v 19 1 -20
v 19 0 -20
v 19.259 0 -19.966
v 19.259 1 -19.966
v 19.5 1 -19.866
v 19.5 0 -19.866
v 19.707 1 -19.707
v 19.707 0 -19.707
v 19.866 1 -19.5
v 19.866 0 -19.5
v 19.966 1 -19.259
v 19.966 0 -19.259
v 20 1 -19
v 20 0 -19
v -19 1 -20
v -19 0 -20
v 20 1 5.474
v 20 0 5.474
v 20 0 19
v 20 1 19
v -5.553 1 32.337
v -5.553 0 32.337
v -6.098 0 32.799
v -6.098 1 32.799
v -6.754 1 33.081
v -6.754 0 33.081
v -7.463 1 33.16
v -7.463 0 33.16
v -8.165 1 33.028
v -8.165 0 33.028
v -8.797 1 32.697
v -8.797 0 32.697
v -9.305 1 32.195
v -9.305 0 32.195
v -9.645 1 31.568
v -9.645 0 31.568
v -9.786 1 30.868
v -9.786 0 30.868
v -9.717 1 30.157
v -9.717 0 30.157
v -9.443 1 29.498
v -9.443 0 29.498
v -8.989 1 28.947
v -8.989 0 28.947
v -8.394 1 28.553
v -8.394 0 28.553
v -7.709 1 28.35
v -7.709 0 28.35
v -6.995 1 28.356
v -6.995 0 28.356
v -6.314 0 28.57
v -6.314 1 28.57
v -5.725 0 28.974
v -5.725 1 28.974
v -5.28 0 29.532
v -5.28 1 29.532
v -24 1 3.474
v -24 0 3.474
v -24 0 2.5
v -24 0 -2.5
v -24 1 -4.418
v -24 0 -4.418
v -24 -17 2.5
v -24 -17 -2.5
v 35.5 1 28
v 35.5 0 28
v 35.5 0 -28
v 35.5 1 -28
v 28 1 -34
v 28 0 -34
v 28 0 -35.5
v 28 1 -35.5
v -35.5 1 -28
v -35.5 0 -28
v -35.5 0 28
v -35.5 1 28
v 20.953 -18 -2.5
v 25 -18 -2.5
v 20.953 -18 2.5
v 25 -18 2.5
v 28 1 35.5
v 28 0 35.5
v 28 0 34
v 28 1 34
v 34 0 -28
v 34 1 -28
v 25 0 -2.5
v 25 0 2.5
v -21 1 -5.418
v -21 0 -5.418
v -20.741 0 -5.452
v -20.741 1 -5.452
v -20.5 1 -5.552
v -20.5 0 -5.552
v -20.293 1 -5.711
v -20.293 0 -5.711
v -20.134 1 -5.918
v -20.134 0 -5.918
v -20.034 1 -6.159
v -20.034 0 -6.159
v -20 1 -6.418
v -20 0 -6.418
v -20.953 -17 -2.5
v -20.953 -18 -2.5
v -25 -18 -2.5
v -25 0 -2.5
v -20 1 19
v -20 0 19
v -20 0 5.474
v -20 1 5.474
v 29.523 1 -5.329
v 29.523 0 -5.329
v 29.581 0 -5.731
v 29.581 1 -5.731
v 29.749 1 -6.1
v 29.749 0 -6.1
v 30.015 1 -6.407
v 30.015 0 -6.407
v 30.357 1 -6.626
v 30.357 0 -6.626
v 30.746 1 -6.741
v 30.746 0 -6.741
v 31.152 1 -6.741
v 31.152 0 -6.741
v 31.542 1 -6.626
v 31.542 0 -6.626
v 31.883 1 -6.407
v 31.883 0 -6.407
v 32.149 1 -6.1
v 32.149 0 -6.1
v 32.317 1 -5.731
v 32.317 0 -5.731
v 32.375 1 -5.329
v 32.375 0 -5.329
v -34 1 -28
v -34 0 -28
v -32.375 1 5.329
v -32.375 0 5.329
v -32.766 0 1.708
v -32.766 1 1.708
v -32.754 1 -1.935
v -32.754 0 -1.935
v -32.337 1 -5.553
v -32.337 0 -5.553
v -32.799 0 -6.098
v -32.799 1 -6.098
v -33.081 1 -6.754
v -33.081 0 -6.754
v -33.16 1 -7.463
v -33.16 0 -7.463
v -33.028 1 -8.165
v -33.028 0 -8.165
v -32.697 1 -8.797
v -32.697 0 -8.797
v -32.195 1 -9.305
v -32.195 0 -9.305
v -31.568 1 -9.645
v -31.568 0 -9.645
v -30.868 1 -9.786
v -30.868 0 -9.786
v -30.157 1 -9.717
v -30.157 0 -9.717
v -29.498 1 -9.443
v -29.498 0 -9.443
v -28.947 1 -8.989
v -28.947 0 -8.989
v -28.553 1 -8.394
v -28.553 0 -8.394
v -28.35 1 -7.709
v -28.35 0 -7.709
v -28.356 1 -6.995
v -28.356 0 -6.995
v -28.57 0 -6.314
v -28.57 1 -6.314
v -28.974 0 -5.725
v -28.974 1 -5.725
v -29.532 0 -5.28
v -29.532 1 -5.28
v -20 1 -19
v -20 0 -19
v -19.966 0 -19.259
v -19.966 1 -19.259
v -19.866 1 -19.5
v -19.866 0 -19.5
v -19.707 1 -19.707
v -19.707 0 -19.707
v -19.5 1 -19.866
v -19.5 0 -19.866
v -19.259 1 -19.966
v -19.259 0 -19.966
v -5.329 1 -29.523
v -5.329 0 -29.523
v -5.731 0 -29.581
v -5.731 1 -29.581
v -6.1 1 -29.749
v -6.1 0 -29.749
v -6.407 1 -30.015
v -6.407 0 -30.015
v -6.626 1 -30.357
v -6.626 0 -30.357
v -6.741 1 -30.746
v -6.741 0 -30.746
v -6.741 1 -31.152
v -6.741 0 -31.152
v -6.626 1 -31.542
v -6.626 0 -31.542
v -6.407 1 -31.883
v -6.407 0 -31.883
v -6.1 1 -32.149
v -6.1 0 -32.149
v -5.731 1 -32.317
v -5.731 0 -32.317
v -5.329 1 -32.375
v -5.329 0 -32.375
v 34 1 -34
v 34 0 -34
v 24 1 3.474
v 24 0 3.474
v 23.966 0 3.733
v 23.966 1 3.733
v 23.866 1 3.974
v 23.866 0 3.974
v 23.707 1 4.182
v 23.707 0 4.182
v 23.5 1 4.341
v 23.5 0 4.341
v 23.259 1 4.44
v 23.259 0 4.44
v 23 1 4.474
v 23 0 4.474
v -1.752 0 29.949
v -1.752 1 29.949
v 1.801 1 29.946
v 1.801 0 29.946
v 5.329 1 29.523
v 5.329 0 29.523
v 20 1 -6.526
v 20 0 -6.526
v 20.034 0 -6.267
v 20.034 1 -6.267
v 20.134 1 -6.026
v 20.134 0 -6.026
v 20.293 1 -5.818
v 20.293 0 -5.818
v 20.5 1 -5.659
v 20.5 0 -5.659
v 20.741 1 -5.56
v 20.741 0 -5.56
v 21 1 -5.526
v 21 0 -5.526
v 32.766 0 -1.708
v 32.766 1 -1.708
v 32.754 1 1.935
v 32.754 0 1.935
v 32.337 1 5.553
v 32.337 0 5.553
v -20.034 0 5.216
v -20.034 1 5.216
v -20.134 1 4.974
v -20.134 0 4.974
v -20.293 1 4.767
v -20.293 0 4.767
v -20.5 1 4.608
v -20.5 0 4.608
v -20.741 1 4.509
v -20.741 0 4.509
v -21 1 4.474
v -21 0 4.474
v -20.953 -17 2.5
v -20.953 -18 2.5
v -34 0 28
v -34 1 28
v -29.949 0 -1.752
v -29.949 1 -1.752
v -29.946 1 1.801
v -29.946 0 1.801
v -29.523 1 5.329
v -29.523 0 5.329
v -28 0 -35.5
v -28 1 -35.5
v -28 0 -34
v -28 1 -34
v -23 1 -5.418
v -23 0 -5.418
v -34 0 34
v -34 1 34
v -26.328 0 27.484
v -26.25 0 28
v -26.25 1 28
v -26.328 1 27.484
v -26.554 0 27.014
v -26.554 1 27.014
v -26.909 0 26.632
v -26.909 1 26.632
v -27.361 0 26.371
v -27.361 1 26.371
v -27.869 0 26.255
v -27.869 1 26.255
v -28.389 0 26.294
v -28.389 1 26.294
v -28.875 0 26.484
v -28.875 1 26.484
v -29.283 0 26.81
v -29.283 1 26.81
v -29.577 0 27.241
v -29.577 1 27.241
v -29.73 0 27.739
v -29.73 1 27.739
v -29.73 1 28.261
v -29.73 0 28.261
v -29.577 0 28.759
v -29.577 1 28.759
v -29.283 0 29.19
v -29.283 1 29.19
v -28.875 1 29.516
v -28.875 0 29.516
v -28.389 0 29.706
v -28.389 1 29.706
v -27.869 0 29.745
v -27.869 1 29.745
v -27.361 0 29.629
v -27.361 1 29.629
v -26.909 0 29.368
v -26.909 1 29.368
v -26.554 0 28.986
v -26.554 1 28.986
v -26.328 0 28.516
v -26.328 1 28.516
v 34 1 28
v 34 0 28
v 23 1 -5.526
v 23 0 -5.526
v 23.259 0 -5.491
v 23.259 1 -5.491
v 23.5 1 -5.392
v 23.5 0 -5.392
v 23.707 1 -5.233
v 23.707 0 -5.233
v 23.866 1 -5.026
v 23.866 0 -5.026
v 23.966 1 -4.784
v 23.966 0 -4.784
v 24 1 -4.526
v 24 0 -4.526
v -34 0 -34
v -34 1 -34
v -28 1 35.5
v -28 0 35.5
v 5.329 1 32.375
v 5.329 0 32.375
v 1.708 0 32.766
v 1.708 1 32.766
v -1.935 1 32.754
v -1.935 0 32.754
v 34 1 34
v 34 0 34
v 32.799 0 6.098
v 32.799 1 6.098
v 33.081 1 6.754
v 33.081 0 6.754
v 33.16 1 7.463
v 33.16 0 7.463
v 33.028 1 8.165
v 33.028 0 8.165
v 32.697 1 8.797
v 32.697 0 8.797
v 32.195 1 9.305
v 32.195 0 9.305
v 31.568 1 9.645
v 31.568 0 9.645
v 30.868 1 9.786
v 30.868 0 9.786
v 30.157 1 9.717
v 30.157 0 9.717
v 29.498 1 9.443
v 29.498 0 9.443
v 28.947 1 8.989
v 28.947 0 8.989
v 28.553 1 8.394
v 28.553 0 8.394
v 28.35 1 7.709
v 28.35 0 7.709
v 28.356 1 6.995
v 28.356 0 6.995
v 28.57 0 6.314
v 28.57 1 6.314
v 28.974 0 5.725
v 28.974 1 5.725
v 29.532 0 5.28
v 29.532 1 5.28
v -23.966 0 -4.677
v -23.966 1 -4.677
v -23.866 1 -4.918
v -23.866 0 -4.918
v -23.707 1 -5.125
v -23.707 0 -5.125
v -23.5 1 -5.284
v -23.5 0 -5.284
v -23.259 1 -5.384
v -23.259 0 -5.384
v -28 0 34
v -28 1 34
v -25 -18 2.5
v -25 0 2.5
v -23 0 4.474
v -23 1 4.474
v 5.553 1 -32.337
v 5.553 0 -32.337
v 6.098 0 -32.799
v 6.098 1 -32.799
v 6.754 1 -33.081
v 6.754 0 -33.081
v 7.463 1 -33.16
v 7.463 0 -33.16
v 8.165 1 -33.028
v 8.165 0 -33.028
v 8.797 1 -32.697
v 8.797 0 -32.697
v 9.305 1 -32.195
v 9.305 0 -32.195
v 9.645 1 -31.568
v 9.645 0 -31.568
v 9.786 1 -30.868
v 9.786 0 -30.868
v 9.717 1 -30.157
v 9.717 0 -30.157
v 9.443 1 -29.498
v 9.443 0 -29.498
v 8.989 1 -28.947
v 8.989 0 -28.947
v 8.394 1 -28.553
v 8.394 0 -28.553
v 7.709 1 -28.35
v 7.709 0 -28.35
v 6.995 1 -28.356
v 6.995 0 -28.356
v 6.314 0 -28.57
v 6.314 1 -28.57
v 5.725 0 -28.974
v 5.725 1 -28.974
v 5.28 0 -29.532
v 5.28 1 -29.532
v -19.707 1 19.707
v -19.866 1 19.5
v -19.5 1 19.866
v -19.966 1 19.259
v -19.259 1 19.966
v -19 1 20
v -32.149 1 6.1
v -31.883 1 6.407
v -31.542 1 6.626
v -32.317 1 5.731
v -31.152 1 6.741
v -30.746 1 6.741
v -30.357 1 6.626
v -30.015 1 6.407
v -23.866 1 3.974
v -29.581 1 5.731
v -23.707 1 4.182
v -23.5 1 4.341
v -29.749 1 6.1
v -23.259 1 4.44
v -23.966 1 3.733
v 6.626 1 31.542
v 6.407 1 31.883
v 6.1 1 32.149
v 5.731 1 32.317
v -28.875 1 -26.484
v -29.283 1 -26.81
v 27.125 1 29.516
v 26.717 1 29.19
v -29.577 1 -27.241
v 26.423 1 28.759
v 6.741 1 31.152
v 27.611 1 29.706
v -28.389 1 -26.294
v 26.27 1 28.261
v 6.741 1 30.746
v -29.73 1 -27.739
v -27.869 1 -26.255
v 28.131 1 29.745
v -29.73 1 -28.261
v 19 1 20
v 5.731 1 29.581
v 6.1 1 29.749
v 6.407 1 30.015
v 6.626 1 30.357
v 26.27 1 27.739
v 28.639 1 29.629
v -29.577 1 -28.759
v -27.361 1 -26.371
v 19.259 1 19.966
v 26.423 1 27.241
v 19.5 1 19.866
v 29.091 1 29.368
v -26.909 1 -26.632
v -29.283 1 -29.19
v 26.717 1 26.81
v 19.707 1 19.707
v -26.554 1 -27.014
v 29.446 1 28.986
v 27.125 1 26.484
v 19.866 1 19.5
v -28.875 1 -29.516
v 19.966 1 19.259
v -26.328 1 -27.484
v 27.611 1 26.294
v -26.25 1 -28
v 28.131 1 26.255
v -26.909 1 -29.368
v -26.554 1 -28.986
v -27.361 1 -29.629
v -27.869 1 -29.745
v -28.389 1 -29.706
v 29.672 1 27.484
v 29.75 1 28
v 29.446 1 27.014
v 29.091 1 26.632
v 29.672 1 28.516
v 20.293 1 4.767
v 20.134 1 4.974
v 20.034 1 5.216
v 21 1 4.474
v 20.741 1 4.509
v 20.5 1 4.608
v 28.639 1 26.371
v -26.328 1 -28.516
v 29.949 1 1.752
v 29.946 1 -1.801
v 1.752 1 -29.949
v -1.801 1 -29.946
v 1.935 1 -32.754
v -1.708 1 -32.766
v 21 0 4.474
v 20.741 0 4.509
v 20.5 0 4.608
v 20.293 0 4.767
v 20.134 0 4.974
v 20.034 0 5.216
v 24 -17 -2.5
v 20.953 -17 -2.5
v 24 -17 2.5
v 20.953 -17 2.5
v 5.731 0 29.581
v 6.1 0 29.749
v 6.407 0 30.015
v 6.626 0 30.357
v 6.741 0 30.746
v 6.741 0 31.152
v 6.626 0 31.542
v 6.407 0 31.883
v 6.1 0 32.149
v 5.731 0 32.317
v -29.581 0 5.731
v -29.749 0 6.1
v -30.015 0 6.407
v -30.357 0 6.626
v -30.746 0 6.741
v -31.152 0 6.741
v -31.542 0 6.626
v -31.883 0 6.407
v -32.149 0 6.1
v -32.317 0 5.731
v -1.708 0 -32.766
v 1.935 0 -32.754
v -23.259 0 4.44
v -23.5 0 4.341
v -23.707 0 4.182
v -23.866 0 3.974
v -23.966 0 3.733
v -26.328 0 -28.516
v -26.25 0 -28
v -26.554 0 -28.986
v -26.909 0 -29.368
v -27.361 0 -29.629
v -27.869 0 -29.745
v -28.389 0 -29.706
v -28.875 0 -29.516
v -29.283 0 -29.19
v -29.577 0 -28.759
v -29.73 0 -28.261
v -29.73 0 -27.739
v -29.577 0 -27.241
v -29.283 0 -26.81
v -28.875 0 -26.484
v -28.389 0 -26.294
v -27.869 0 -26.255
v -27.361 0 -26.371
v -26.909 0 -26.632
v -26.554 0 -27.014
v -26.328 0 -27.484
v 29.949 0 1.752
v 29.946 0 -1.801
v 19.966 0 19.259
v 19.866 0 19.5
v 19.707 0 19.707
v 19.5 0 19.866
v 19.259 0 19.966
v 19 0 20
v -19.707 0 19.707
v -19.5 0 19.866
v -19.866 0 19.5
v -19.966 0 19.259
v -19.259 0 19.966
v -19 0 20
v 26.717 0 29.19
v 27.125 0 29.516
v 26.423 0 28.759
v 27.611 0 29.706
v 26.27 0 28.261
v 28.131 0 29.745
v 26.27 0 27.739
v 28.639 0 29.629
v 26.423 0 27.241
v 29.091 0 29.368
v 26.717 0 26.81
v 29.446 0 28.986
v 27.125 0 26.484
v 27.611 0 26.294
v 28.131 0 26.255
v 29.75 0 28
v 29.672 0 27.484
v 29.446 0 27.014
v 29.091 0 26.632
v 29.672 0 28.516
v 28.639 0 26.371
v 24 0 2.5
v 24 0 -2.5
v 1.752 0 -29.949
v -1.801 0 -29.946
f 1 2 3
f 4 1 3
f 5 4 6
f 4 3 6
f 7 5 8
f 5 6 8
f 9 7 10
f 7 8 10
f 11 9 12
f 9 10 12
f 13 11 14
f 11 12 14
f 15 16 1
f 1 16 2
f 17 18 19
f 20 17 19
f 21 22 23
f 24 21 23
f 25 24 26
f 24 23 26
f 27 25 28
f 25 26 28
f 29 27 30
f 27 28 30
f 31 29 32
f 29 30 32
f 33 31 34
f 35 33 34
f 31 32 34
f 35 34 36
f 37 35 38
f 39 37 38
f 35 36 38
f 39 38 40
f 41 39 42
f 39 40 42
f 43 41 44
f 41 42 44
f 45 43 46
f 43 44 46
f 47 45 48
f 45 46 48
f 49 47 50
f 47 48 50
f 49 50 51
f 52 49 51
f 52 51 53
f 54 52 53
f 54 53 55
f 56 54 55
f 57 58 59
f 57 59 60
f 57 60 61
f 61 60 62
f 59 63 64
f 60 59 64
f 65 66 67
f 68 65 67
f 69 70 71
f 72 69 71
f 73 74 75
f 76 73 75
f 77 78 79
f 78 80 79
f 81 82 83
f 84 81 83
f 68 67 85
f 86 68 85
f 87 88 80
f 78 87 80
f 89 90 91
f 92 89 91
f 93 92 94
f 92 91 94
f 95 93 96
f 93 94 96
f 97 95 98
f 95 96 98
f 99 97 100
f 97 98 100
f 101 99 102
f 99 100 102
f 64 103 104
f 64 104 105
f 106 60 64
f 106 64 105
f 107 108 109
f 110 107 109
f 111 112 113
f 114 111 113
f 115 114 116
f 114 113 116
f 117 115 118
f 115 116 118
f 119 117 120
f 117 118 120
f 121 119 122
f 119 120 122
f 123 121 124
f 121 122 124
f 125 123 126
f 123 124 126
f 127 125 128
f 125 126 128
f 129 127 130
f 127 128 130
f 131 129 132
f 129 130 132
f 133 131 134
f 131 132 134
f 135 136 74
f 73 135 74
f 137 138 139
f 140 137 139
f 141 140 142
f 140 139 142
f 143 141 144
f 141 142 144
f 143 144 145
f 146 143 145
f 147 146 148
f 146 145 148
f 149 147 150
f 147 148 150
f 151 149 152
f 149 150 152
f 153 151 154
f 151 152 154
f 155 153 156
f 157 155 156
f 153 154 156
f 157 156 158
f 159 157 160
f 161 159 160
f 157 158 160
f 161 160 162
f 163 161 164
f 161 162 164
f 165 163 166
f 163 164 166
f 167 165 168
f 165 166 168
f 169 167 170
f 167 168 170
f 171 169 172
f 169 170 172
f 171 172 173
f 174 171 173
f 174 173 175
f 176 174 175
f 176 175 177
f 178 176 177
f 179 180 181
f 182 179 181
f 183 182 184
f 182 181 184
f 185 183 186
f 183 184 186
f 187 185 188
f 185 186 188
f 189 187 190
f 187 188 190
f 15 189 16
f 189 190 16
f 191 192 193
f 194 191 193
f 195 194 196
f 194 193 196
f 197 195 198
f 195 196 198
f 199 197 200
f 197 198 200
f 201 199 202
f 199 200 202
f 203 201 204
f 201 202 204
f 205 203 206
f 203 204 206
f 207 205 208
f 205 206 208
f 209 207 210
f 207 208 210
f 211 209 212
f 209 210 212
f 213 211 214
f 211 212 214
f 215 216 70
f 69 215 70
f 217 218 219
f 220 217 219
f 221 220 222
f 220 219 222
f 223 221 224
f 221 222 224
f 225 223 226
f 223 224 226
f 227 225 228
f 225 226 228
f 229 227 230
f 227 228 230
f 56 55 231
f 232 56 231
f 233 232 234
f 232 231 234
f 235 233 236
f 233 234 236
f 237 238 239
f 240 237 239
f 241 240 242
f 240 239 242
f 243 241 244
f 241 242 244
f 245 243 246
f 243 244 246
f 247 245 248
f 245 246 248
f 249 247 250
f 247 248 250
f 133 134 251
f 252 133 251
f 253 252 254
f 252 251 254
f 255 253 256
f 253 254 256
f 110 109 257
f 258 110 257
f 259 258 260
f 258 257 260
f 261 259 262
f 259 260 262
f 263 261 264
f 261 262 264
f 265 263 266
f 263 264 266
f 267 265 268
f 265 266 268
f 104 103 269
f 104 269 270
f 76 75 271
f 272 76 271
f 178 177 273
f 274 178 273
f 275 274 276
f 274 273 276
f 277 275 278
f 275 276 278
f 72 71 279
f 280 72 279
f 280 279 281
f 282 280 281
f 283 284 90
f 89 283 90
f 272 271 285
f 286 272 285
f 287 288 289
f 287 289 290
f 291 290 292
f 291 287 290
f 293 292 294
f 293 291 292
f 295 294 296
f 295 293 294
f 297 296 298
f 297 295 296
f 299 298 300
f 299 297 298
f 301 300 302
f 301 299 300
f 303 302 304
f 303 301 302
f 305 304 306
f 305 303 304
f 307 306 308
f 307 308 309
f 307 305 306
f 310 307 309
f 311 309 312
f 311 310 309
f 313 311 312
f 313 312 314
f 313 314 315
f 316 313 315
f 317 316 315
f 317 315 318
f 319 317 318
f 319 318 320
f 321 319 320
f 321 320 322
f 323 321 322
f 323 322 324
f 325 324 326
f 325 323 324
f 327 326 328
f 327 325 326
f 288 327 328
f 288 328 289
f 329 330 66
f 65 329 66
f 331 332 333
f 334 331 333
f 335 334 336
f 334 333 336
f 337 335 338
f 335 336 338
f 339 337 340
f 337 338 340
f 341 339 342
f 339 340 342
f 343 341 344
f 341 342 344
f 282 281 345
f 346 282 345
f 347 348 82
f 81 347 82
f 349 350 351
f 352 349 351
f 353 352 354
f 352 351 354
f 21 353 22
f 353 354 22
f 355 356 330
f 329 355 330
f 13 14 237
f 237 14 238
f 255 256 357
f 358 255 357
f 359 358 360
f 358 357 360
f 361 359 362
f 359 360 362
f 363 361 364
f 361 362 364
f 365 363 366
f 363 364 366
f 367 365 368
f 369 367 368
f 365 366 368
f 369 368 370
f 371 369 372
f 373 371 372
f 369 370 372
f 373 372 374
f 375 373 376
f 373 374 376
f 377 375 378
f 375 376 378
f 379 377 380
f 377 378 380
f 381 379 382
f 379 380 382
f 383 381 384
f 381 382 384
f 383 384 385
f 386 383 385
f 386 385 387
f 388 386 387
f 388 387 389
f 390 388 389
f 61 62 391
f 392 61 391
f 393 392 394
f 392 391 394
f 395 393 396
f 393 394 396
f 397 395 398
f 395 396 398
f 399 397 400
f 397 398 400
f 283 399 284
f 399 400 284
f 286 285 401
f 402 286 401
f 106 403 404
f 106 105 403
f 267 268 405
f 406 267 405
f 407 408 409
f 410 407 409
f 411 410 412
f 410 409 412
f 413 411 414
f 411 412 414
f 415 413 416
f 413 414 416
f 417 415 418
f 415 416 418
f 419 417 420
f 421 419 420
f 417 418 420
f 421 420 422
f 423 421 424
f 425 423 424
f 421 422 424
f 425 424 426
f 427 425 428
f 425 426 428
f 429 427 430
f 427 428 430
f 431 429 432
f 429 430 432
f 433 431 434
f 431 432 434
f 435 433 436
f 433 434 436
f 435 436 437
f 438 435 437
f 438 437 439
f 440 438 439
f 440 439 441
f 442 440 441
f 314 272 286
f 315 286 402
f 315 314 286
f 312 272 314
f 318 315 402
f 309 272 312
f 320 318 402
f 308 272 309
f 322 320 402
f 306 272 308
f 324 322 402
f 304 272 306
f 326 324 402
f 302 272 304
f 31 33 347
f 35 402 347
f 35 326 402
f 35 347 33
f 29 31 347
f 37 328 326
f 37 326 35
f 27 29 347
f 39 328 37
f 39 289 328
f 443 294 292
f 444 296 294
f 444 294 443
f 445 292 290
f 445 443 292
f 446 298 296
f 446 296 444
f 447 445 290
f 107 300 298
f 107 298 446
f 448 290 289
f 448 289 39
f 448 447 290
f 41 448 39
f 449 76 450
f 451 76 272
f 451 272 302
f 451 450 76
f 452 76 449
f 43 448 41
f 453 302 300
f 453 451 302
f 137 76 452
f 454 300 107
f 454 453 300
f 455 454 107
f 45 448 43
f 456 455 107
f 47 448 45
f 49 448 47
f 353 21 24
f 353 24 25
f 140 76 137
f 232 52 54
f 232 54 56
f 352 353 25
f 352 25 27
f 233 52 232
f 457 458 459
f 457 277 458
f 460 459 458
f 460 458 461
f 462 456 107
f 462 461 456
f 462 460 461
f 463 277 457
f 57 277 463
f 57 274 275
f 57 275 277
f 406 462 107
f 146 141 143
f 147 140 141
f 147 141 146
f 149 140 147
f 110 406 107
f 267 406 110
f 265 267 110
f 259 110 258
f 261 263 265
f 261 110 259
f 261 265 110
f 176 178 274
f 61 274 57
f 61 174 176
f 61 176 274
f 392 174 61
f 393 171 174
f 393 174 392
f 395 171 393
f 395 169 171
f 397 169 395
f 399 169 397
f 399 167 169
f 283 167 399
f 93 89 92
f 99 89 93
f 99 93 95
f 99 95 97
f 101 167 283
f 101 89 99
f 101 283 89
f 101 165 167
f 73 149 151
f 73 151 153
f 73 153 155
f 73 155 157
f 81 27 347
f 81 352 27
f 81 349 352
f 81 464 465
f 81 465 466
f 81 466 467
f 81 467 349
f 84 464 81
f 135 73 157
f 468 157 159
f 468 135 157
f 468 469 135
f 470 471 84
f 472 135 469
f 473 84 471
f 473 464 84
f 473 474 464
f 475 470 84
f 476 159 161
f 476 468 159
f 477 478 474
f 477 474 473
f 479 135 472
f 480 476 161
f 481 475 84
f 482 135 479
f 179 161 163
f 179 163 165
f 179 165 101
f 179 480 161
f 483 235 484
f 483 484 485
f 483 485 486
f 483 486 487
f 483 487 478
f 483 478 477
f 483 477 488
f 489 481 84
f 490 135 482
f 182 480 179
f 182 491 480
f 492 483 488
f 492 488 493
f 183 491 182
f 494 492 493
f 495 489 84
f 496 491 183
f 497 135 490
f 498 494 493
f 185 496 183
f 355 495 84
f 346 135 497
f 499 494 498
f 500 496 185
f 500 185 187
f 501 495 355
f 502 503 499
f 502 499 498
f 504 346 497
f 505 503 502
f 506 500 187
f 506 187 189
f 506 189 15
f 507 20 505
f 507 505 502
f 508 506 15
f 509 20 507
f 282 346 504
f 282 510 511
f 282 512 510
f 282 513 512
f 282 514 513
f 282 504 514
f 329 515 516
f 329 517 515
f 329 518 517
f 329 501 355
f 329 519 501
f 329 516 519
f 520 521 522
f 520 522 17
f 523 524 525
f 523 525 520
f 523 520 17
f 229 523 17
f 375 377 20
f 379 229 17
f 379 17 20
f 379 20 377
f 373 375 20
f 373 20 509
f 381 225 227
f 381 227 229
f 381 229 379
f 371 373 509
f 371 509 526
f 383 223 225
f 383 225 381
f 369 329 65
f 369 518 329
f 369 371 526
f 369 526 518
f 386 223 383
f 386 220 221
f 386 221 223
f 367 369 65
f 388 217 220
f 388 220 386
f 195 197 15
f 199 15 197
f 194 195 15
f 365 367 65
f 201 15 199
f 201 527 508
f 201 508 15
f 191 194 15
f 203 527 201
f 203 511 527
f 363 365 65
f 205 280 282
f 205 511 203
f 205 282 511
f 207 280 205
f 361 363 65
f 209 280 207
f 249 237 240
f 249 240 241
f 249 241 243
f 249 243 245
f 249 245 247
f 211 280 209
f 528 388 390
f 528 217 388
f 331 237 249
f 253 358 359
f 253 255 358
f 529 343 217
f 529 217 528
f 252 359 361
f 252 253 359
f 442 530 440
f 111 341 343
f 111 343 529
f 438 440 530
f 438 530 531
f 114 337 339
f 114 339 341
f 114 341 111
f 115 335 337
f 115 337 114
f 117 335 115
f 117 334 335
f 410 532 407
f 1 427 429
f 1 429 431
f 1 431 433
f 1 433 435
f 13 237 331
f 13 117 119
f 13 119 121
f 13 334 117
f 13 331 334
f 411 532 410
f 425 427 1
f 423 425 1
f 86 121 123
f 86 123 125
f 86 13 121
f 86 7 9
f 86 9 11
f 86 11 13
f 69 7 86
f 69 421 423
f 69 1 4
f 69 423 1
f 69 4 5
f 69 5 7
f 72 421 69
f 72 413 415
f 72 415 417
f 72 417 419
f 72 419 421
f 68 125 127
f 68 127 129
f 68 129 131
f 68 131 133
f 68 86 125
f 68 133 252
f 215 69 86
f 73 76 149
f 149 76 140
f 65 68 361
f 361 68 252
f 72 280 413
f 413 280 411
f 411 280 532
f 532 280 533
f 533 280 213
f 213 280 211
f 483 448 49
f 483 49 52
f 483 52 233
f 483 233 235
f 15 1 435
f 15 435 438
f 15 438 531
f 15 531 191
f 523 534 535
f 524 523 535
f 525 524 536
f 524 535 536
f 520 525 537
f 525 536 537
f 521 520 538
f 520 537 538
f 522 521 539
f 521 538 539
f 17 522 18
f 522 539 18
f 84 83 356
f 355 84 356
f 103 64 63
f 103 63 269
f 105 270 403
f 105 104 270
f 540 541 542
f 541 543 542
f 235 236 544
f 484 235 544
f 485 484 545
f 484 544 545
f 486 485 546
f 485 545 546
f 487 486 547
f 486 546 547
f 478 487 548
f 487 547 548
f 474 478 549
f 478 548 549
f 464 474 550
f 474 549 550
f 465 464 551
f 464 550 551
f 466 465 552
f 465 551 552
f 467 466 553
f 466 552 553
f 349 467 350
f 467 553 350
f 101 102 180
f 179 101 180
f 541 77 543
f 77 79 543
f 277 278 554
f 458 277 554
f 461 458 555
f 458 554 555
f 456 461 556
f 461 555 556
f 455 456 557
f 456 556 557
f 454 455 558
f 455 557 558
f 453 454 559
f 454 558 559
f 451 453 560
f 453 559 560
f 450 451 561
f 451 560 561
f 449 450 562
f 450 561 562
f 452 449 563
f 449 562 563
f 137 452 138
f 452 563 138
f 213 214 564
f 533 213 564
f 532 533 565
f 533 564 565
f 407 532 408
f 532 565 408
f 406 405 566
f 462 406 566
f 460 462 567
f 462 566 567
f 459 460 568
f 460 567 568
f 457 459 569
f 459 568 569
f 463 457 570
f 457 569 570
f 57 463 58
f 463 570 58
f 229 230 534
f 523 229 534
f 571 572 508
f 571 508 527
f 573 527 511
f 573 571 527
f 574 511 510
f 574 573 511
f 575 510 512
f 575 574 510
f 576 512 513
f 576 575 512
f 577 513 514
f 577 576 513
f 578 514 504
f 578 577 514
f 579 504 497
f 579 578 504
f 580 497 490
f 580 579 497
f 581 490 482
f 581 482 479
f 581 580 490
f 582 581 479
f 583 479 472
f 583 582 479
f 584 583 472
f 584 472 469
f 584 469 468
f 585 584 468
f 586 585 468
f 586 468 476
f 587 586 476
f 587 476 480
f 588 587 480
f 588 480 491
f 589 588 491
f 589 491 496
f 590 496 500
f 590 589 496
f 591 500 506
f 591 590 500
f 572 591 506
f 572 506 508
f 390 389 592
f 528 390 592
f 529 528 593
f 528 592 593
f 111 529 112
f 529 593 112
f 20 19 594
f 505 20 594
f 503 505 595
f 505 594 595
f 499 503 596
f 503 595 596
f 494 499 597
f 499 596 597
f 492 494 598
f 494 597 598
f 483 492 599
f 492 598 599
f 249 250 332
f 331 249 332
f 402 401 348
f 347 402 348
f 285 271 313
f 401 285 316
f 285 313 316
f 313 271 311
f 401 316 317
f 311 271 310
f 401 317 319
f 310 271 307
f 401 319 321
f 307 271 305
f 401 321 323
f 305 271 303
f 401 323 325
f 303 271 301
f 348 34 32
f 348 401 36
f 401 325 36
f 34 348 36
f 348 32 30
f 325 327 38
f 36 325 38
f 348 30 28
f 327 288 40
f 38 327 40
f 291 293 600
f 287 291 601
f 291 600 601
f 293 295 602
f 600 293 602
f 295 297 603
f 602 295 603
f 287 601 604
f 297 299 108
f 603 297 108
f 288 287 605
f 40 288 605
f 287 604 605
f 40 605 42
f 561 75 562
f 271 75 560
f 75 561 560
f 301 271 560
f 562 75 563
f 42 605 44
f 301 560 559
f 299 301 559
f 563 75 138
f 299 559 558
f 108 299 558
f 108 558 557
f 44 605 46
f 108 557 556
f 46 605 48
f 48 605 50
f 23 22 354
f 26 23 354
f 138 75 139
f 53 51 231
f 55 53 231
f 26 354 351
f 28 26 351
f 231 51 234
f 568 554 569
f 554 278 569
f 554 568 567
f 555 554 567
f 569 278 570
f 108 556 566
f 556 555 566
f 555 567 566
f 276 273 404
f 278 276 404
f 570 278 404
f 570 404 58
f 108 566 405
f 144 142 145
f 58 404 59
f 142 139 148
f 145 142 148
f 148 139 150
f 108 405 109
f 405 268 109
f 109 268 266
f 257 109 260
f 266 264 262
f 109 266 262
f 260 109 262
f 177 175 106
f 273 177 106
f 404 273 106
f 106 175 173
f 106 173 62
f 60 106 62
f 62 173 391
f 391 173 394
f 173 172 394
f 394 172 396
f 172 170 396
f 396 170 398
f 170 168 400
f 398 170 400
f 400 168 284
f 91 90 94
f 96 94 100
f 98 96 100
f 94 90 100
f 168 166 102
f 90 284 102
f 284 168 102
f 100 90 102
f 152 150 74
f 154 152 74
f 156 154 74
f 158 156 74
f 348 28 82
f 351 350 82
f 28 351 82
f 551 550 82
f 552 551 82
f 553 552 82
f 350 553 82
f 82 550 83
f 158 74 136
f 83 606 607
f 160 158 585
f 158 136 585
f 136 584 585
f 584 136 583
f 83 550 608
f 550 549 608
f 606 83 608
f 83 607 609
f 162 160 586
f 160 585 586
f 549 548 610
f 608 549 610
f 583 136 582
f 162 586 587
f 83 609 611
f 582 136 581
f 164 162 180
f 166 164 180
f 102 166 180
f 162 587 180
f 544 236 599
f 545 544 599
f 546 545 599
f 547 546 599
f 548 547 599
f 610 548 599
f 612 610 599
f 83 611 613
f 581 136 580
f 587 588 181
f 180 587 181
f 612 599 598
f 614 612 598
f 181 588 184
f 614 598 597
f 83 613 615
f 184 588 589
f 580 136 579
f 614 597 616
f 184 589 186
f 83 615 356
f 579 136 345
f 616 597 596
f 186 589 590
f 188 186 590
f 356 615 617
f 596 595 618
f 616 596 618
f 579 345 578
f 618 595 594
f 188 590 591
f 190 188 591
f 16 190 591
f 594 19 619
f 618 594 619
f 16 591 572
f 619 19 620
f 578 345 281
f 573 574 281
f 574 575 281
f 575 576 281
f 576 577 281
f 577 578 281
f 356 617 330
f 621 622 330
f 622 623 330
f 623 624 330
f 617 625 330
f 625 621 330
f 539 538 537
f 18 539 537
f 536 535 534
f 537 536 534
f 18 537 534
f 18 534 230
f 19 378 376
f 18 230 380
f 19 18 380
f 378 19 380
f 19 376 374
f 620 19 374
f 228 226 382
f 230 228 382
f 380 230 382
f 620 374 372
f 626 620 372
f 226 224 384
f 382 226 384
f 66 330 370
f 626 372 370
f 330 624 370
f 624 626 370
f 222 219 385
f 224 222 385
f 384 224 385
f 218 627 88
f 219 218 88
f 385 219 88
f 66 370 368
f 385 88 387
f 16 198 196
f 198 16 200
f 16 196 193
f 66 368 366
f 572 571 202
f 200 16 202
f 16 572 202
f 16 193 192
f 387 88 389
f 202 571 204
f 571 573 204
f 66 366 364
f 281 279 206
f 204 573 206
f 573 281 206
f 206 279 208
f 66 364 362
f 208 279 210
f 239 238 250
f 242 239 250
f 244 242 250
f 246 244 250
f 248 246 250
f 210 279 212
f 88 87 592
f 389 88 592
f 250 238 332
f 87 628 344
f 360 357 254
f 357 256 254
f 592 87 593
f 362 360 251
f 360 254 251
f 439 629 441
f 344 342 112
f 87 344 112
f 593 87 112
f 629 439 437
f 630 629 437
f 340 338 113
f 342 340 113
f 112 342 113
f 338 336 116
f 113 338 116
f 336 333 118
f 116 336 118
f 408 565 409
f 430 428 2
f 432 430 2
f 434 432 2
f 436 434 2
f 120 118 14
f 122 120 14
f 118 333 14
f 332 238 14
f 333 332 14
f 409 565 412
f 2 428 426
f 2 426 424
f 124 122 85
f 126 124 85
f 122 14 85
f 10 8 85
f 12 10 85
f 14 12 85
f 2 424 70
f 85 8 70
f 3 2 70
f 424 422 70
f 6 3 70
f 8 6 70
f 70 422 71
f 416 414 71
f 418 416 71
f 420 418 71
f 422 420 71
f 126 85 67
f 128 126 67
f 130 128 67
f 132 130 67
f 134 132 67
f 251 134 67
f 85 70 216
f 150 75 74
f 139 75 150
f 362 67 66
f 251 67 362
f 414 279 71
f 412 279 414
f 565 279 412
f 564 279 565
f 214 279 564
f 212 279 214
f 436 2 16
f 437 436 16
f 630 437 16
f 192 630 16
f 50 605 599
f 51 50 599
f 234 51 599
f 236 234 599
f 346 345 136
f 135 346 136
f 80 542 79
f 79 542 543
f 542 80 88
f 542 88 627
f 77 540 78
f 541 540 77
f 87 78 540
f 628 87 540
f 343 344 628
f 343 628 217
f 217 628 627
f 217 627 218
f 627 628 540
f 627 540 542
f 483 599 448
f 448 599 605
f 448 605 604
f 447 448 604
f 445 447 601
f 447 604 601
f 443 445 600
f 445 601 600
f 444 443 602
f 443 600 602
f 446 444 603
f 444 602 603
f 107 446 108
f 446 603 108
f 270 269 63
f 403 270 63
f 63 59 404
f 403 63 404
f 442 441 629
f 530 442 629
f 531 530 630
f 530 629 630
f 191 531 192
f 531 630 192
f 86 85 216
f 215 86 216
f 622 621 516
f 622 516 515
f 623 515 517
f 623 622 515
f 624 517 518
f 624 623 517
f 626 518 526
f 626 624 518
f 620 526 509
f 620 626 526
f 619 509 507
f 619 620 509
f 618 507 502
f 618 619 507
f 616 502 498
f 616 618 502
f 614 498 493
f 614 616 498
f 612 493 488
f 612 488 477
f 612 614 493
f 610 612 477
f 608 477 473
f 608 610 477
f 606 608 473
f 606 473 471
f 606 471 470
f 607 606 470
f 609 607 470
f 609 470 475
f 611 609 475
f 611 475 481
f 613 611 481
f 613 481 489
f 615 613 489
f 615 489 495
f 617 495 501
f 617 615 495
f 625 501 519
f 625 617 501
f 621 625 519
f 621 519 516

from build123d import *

# Parameters (mm, degrees)
SKETCH_2_R      = 1.75
EXTRUDE_1_DEPTH = 1
EXTRUDE_2_DEPTH = 2.5


with BuildPart() as part:
    # Эскиз2 → Бобышка-Вытянуть1 (new body)
    with BuildSketch(Plane(origin=(0, 0, 0), x_dir=(1, 0, 0), z_dir=(0, 1, 0))):
        Polygon((-35.5, 28), (-35.5, -28), (-34, -28), (-34, -34), (-28, -34), (-28, -35.5), (28, -35.5), (28, -34), (34, -34), (34, -28), (35.5, -28), (35.5, 28), (34, 28), (34, 34), (28, 34), (28, 35.5), (-28, 35.5), (-28, 34), (-34, 34), (-34, 28), align=None)
        with Locations((28, -28)):
            Circle(SKETCH_2_R, mode=Mode.SUBTRACT)
        with Locations((-28, -28)):
            Circle(SKETCH_2_R, mode=Mode.SUBTRACT)
        with Locations((-28, 28)):
            Circle(SKETCH_2_R, mode=Mode.SUBTRACT)
        with BuildLine():
            Line((20, 19), (20, 6.525504327))
            ThreePointArc((20, 6.525504327), (20.292893219, 5.818397545), (21, 5.525504327))
            Line((21, 5.525504327), (23, 5.525504327))
            ThreePointArc((23, 5.525504327), (23.707106781, 5.232611108), (24, 4.525504327))
            Line((24, 4.525504327), (24, -3.474495673))
            ThreePointArc((24, -3.474495673), (23.707106781, -4.181602455), (23, -4.474495673))
            Line((23, -4.474495673), (21, -4.474495673))
            ThreePointArc((21, -4.474495673), (20.292893219, -4.767388892), (20, -5.474495673))
            Line((20, -5.474495673), (20, -19))
            ThreePointArc((20, -19), (19.707106781, -19.707106781), (19, -20))
            Line((19, -20), (-19, -20))
            ThreePointArc((-19, -20), (-19.707106781, -19.707106781), (-20, -19))
            Line((-20, -19), (-20, -5.474495673))
            ThreePointArc((-20, -5.474495673), (-20.292893219, -4.767388892), (-21, -4.474495673))
            Line((-21, -4.474495673), (-23, -4.474495673))
            ThreePointArc((-23, -4.474495673), (-23.707106781, -4.181602455), (-24, -3.474495673))
            Line((-24, -3.474495673), (-24, 4.418145483))
            ThreePointArc((-24, 4.418145483), (-23.707106781, 5.125252264), (-23, 5.418145483))
            Line((-23, 5.418145483), (-21, 5.418145483))
            ThreePointArc((-21, 5.418145483), (-20.292893219, 5.711038701), (-20, 6.418145483))
            Line((-20, 6.418145483), (-20, 19))
            ThreePointArc((-20, 19), (-19.707106781, 19.707106781), (-19, 20))
            Line((-19, 20), (19, 20))
            ThreePointArc((19, 20), (19.707106781, 19.707106781), (20, 19))
        make_face(mode=Mode.SUBTRACT)
        with BuildLine():
            ThreePointArc((-32.375246916, -5.328874762), (-32.81067753, 0.113838264), (-32.337490331, 5.553398796))
            ThreePointArc((-32.337490331, 5.553398796), (-30.509920838, 9.7779661), (-29.531671369, 5.280188077))
            ThreePointArc((-29.531671369, 5.280188077), (-29.999989805, -0.024733046), (-29.522924885, -5.328874762))
            ThreePointArc((-29.522924885, -5.328874762), (-30.949085901, -6.755035778), (-32.375246916, -5.328874762))
        make_face(mode=Mode.SUBTRACT)
        with BuildLine():
            ThreePointArc((5.553398796, 32.337490331), (9.7779661, 30.509920838), (5.280188077, 29.531671369))
            ThreePointArc((5.280188077, 29.531671369), (-0.024733046, 29.999989805), (-5.328874762, 29.522924885))
            ThreePointArc((-5.328874762, 29.522924885), (-6.755035778, 30.949085901), (-5.328874762, 32.375246916))
            ThreePointArc((-5.328874762, 32.375246916), (0.113838264, 32.81067753), (5.553398796, 32.337490331))
        make_face(mode=Mode.SUBTRACT)
        with BuildLine():
            ThreePointArc((32.337490331, -5.553398796), (30.509920838, -9.7779661), (29.531671369, -5.280188077))
            ThreePointArc((29.531671369, -5.280188077), (29.999989805, 0.024733046), (29.522924885, 5.328874762))
            ThreePointArc((29.522924885, 5.328874762), (30.949085901, 6.755035778), (32.375246916, 5.328874762))
            ThreePointArc((32.375246916, 5.328874762), (32.81067753, -0.113838264), (32.337490331, -5.553398796))
        make_face(mode=Mode.SUBTRACT)
        with BuildLine():
            ThreePointArc((-5.553398796, -32.337490331), (-9.7779661, -30.509920838), (-5.280188077, -29.531671369))
            ThreePointArc((-5.280188077, -29.531671369), (0.024733046, -29.999989805), (5.328874762, -29.522924885))
            ThreePointArc((5.328874762, -29.522924885), (6.755035778, -30.949085901), (5.328874762, -32.375246916))
            ThreePointArc((5.328874762, -32.375246916), (-0.113838264, -32.81067753), (-5.553398796, -32.337490331))
        make_face(mode=Mode.SUBTRACT)
    extrude(amount=EXTRUDE_1_DEPTH)

    # Эскиз3 → Бобышка-Вытянуть2 (add, symmetric)
    with BuildSketch(Plane.XY):
        Polygon((-25, 0), (-24, 0), (-24, -17), (-20.953427174, -17), (-20.953427174, -18), (-25, -18), align=None)
        Polygon((25, 0), (25, -18), (20.953427174, -18), (20.953427174, -17), (24, -17), (24, 0), align=None)
    extrude(amount=EXTRUDE_2_DEPTH, both=True)


solid = part.part
